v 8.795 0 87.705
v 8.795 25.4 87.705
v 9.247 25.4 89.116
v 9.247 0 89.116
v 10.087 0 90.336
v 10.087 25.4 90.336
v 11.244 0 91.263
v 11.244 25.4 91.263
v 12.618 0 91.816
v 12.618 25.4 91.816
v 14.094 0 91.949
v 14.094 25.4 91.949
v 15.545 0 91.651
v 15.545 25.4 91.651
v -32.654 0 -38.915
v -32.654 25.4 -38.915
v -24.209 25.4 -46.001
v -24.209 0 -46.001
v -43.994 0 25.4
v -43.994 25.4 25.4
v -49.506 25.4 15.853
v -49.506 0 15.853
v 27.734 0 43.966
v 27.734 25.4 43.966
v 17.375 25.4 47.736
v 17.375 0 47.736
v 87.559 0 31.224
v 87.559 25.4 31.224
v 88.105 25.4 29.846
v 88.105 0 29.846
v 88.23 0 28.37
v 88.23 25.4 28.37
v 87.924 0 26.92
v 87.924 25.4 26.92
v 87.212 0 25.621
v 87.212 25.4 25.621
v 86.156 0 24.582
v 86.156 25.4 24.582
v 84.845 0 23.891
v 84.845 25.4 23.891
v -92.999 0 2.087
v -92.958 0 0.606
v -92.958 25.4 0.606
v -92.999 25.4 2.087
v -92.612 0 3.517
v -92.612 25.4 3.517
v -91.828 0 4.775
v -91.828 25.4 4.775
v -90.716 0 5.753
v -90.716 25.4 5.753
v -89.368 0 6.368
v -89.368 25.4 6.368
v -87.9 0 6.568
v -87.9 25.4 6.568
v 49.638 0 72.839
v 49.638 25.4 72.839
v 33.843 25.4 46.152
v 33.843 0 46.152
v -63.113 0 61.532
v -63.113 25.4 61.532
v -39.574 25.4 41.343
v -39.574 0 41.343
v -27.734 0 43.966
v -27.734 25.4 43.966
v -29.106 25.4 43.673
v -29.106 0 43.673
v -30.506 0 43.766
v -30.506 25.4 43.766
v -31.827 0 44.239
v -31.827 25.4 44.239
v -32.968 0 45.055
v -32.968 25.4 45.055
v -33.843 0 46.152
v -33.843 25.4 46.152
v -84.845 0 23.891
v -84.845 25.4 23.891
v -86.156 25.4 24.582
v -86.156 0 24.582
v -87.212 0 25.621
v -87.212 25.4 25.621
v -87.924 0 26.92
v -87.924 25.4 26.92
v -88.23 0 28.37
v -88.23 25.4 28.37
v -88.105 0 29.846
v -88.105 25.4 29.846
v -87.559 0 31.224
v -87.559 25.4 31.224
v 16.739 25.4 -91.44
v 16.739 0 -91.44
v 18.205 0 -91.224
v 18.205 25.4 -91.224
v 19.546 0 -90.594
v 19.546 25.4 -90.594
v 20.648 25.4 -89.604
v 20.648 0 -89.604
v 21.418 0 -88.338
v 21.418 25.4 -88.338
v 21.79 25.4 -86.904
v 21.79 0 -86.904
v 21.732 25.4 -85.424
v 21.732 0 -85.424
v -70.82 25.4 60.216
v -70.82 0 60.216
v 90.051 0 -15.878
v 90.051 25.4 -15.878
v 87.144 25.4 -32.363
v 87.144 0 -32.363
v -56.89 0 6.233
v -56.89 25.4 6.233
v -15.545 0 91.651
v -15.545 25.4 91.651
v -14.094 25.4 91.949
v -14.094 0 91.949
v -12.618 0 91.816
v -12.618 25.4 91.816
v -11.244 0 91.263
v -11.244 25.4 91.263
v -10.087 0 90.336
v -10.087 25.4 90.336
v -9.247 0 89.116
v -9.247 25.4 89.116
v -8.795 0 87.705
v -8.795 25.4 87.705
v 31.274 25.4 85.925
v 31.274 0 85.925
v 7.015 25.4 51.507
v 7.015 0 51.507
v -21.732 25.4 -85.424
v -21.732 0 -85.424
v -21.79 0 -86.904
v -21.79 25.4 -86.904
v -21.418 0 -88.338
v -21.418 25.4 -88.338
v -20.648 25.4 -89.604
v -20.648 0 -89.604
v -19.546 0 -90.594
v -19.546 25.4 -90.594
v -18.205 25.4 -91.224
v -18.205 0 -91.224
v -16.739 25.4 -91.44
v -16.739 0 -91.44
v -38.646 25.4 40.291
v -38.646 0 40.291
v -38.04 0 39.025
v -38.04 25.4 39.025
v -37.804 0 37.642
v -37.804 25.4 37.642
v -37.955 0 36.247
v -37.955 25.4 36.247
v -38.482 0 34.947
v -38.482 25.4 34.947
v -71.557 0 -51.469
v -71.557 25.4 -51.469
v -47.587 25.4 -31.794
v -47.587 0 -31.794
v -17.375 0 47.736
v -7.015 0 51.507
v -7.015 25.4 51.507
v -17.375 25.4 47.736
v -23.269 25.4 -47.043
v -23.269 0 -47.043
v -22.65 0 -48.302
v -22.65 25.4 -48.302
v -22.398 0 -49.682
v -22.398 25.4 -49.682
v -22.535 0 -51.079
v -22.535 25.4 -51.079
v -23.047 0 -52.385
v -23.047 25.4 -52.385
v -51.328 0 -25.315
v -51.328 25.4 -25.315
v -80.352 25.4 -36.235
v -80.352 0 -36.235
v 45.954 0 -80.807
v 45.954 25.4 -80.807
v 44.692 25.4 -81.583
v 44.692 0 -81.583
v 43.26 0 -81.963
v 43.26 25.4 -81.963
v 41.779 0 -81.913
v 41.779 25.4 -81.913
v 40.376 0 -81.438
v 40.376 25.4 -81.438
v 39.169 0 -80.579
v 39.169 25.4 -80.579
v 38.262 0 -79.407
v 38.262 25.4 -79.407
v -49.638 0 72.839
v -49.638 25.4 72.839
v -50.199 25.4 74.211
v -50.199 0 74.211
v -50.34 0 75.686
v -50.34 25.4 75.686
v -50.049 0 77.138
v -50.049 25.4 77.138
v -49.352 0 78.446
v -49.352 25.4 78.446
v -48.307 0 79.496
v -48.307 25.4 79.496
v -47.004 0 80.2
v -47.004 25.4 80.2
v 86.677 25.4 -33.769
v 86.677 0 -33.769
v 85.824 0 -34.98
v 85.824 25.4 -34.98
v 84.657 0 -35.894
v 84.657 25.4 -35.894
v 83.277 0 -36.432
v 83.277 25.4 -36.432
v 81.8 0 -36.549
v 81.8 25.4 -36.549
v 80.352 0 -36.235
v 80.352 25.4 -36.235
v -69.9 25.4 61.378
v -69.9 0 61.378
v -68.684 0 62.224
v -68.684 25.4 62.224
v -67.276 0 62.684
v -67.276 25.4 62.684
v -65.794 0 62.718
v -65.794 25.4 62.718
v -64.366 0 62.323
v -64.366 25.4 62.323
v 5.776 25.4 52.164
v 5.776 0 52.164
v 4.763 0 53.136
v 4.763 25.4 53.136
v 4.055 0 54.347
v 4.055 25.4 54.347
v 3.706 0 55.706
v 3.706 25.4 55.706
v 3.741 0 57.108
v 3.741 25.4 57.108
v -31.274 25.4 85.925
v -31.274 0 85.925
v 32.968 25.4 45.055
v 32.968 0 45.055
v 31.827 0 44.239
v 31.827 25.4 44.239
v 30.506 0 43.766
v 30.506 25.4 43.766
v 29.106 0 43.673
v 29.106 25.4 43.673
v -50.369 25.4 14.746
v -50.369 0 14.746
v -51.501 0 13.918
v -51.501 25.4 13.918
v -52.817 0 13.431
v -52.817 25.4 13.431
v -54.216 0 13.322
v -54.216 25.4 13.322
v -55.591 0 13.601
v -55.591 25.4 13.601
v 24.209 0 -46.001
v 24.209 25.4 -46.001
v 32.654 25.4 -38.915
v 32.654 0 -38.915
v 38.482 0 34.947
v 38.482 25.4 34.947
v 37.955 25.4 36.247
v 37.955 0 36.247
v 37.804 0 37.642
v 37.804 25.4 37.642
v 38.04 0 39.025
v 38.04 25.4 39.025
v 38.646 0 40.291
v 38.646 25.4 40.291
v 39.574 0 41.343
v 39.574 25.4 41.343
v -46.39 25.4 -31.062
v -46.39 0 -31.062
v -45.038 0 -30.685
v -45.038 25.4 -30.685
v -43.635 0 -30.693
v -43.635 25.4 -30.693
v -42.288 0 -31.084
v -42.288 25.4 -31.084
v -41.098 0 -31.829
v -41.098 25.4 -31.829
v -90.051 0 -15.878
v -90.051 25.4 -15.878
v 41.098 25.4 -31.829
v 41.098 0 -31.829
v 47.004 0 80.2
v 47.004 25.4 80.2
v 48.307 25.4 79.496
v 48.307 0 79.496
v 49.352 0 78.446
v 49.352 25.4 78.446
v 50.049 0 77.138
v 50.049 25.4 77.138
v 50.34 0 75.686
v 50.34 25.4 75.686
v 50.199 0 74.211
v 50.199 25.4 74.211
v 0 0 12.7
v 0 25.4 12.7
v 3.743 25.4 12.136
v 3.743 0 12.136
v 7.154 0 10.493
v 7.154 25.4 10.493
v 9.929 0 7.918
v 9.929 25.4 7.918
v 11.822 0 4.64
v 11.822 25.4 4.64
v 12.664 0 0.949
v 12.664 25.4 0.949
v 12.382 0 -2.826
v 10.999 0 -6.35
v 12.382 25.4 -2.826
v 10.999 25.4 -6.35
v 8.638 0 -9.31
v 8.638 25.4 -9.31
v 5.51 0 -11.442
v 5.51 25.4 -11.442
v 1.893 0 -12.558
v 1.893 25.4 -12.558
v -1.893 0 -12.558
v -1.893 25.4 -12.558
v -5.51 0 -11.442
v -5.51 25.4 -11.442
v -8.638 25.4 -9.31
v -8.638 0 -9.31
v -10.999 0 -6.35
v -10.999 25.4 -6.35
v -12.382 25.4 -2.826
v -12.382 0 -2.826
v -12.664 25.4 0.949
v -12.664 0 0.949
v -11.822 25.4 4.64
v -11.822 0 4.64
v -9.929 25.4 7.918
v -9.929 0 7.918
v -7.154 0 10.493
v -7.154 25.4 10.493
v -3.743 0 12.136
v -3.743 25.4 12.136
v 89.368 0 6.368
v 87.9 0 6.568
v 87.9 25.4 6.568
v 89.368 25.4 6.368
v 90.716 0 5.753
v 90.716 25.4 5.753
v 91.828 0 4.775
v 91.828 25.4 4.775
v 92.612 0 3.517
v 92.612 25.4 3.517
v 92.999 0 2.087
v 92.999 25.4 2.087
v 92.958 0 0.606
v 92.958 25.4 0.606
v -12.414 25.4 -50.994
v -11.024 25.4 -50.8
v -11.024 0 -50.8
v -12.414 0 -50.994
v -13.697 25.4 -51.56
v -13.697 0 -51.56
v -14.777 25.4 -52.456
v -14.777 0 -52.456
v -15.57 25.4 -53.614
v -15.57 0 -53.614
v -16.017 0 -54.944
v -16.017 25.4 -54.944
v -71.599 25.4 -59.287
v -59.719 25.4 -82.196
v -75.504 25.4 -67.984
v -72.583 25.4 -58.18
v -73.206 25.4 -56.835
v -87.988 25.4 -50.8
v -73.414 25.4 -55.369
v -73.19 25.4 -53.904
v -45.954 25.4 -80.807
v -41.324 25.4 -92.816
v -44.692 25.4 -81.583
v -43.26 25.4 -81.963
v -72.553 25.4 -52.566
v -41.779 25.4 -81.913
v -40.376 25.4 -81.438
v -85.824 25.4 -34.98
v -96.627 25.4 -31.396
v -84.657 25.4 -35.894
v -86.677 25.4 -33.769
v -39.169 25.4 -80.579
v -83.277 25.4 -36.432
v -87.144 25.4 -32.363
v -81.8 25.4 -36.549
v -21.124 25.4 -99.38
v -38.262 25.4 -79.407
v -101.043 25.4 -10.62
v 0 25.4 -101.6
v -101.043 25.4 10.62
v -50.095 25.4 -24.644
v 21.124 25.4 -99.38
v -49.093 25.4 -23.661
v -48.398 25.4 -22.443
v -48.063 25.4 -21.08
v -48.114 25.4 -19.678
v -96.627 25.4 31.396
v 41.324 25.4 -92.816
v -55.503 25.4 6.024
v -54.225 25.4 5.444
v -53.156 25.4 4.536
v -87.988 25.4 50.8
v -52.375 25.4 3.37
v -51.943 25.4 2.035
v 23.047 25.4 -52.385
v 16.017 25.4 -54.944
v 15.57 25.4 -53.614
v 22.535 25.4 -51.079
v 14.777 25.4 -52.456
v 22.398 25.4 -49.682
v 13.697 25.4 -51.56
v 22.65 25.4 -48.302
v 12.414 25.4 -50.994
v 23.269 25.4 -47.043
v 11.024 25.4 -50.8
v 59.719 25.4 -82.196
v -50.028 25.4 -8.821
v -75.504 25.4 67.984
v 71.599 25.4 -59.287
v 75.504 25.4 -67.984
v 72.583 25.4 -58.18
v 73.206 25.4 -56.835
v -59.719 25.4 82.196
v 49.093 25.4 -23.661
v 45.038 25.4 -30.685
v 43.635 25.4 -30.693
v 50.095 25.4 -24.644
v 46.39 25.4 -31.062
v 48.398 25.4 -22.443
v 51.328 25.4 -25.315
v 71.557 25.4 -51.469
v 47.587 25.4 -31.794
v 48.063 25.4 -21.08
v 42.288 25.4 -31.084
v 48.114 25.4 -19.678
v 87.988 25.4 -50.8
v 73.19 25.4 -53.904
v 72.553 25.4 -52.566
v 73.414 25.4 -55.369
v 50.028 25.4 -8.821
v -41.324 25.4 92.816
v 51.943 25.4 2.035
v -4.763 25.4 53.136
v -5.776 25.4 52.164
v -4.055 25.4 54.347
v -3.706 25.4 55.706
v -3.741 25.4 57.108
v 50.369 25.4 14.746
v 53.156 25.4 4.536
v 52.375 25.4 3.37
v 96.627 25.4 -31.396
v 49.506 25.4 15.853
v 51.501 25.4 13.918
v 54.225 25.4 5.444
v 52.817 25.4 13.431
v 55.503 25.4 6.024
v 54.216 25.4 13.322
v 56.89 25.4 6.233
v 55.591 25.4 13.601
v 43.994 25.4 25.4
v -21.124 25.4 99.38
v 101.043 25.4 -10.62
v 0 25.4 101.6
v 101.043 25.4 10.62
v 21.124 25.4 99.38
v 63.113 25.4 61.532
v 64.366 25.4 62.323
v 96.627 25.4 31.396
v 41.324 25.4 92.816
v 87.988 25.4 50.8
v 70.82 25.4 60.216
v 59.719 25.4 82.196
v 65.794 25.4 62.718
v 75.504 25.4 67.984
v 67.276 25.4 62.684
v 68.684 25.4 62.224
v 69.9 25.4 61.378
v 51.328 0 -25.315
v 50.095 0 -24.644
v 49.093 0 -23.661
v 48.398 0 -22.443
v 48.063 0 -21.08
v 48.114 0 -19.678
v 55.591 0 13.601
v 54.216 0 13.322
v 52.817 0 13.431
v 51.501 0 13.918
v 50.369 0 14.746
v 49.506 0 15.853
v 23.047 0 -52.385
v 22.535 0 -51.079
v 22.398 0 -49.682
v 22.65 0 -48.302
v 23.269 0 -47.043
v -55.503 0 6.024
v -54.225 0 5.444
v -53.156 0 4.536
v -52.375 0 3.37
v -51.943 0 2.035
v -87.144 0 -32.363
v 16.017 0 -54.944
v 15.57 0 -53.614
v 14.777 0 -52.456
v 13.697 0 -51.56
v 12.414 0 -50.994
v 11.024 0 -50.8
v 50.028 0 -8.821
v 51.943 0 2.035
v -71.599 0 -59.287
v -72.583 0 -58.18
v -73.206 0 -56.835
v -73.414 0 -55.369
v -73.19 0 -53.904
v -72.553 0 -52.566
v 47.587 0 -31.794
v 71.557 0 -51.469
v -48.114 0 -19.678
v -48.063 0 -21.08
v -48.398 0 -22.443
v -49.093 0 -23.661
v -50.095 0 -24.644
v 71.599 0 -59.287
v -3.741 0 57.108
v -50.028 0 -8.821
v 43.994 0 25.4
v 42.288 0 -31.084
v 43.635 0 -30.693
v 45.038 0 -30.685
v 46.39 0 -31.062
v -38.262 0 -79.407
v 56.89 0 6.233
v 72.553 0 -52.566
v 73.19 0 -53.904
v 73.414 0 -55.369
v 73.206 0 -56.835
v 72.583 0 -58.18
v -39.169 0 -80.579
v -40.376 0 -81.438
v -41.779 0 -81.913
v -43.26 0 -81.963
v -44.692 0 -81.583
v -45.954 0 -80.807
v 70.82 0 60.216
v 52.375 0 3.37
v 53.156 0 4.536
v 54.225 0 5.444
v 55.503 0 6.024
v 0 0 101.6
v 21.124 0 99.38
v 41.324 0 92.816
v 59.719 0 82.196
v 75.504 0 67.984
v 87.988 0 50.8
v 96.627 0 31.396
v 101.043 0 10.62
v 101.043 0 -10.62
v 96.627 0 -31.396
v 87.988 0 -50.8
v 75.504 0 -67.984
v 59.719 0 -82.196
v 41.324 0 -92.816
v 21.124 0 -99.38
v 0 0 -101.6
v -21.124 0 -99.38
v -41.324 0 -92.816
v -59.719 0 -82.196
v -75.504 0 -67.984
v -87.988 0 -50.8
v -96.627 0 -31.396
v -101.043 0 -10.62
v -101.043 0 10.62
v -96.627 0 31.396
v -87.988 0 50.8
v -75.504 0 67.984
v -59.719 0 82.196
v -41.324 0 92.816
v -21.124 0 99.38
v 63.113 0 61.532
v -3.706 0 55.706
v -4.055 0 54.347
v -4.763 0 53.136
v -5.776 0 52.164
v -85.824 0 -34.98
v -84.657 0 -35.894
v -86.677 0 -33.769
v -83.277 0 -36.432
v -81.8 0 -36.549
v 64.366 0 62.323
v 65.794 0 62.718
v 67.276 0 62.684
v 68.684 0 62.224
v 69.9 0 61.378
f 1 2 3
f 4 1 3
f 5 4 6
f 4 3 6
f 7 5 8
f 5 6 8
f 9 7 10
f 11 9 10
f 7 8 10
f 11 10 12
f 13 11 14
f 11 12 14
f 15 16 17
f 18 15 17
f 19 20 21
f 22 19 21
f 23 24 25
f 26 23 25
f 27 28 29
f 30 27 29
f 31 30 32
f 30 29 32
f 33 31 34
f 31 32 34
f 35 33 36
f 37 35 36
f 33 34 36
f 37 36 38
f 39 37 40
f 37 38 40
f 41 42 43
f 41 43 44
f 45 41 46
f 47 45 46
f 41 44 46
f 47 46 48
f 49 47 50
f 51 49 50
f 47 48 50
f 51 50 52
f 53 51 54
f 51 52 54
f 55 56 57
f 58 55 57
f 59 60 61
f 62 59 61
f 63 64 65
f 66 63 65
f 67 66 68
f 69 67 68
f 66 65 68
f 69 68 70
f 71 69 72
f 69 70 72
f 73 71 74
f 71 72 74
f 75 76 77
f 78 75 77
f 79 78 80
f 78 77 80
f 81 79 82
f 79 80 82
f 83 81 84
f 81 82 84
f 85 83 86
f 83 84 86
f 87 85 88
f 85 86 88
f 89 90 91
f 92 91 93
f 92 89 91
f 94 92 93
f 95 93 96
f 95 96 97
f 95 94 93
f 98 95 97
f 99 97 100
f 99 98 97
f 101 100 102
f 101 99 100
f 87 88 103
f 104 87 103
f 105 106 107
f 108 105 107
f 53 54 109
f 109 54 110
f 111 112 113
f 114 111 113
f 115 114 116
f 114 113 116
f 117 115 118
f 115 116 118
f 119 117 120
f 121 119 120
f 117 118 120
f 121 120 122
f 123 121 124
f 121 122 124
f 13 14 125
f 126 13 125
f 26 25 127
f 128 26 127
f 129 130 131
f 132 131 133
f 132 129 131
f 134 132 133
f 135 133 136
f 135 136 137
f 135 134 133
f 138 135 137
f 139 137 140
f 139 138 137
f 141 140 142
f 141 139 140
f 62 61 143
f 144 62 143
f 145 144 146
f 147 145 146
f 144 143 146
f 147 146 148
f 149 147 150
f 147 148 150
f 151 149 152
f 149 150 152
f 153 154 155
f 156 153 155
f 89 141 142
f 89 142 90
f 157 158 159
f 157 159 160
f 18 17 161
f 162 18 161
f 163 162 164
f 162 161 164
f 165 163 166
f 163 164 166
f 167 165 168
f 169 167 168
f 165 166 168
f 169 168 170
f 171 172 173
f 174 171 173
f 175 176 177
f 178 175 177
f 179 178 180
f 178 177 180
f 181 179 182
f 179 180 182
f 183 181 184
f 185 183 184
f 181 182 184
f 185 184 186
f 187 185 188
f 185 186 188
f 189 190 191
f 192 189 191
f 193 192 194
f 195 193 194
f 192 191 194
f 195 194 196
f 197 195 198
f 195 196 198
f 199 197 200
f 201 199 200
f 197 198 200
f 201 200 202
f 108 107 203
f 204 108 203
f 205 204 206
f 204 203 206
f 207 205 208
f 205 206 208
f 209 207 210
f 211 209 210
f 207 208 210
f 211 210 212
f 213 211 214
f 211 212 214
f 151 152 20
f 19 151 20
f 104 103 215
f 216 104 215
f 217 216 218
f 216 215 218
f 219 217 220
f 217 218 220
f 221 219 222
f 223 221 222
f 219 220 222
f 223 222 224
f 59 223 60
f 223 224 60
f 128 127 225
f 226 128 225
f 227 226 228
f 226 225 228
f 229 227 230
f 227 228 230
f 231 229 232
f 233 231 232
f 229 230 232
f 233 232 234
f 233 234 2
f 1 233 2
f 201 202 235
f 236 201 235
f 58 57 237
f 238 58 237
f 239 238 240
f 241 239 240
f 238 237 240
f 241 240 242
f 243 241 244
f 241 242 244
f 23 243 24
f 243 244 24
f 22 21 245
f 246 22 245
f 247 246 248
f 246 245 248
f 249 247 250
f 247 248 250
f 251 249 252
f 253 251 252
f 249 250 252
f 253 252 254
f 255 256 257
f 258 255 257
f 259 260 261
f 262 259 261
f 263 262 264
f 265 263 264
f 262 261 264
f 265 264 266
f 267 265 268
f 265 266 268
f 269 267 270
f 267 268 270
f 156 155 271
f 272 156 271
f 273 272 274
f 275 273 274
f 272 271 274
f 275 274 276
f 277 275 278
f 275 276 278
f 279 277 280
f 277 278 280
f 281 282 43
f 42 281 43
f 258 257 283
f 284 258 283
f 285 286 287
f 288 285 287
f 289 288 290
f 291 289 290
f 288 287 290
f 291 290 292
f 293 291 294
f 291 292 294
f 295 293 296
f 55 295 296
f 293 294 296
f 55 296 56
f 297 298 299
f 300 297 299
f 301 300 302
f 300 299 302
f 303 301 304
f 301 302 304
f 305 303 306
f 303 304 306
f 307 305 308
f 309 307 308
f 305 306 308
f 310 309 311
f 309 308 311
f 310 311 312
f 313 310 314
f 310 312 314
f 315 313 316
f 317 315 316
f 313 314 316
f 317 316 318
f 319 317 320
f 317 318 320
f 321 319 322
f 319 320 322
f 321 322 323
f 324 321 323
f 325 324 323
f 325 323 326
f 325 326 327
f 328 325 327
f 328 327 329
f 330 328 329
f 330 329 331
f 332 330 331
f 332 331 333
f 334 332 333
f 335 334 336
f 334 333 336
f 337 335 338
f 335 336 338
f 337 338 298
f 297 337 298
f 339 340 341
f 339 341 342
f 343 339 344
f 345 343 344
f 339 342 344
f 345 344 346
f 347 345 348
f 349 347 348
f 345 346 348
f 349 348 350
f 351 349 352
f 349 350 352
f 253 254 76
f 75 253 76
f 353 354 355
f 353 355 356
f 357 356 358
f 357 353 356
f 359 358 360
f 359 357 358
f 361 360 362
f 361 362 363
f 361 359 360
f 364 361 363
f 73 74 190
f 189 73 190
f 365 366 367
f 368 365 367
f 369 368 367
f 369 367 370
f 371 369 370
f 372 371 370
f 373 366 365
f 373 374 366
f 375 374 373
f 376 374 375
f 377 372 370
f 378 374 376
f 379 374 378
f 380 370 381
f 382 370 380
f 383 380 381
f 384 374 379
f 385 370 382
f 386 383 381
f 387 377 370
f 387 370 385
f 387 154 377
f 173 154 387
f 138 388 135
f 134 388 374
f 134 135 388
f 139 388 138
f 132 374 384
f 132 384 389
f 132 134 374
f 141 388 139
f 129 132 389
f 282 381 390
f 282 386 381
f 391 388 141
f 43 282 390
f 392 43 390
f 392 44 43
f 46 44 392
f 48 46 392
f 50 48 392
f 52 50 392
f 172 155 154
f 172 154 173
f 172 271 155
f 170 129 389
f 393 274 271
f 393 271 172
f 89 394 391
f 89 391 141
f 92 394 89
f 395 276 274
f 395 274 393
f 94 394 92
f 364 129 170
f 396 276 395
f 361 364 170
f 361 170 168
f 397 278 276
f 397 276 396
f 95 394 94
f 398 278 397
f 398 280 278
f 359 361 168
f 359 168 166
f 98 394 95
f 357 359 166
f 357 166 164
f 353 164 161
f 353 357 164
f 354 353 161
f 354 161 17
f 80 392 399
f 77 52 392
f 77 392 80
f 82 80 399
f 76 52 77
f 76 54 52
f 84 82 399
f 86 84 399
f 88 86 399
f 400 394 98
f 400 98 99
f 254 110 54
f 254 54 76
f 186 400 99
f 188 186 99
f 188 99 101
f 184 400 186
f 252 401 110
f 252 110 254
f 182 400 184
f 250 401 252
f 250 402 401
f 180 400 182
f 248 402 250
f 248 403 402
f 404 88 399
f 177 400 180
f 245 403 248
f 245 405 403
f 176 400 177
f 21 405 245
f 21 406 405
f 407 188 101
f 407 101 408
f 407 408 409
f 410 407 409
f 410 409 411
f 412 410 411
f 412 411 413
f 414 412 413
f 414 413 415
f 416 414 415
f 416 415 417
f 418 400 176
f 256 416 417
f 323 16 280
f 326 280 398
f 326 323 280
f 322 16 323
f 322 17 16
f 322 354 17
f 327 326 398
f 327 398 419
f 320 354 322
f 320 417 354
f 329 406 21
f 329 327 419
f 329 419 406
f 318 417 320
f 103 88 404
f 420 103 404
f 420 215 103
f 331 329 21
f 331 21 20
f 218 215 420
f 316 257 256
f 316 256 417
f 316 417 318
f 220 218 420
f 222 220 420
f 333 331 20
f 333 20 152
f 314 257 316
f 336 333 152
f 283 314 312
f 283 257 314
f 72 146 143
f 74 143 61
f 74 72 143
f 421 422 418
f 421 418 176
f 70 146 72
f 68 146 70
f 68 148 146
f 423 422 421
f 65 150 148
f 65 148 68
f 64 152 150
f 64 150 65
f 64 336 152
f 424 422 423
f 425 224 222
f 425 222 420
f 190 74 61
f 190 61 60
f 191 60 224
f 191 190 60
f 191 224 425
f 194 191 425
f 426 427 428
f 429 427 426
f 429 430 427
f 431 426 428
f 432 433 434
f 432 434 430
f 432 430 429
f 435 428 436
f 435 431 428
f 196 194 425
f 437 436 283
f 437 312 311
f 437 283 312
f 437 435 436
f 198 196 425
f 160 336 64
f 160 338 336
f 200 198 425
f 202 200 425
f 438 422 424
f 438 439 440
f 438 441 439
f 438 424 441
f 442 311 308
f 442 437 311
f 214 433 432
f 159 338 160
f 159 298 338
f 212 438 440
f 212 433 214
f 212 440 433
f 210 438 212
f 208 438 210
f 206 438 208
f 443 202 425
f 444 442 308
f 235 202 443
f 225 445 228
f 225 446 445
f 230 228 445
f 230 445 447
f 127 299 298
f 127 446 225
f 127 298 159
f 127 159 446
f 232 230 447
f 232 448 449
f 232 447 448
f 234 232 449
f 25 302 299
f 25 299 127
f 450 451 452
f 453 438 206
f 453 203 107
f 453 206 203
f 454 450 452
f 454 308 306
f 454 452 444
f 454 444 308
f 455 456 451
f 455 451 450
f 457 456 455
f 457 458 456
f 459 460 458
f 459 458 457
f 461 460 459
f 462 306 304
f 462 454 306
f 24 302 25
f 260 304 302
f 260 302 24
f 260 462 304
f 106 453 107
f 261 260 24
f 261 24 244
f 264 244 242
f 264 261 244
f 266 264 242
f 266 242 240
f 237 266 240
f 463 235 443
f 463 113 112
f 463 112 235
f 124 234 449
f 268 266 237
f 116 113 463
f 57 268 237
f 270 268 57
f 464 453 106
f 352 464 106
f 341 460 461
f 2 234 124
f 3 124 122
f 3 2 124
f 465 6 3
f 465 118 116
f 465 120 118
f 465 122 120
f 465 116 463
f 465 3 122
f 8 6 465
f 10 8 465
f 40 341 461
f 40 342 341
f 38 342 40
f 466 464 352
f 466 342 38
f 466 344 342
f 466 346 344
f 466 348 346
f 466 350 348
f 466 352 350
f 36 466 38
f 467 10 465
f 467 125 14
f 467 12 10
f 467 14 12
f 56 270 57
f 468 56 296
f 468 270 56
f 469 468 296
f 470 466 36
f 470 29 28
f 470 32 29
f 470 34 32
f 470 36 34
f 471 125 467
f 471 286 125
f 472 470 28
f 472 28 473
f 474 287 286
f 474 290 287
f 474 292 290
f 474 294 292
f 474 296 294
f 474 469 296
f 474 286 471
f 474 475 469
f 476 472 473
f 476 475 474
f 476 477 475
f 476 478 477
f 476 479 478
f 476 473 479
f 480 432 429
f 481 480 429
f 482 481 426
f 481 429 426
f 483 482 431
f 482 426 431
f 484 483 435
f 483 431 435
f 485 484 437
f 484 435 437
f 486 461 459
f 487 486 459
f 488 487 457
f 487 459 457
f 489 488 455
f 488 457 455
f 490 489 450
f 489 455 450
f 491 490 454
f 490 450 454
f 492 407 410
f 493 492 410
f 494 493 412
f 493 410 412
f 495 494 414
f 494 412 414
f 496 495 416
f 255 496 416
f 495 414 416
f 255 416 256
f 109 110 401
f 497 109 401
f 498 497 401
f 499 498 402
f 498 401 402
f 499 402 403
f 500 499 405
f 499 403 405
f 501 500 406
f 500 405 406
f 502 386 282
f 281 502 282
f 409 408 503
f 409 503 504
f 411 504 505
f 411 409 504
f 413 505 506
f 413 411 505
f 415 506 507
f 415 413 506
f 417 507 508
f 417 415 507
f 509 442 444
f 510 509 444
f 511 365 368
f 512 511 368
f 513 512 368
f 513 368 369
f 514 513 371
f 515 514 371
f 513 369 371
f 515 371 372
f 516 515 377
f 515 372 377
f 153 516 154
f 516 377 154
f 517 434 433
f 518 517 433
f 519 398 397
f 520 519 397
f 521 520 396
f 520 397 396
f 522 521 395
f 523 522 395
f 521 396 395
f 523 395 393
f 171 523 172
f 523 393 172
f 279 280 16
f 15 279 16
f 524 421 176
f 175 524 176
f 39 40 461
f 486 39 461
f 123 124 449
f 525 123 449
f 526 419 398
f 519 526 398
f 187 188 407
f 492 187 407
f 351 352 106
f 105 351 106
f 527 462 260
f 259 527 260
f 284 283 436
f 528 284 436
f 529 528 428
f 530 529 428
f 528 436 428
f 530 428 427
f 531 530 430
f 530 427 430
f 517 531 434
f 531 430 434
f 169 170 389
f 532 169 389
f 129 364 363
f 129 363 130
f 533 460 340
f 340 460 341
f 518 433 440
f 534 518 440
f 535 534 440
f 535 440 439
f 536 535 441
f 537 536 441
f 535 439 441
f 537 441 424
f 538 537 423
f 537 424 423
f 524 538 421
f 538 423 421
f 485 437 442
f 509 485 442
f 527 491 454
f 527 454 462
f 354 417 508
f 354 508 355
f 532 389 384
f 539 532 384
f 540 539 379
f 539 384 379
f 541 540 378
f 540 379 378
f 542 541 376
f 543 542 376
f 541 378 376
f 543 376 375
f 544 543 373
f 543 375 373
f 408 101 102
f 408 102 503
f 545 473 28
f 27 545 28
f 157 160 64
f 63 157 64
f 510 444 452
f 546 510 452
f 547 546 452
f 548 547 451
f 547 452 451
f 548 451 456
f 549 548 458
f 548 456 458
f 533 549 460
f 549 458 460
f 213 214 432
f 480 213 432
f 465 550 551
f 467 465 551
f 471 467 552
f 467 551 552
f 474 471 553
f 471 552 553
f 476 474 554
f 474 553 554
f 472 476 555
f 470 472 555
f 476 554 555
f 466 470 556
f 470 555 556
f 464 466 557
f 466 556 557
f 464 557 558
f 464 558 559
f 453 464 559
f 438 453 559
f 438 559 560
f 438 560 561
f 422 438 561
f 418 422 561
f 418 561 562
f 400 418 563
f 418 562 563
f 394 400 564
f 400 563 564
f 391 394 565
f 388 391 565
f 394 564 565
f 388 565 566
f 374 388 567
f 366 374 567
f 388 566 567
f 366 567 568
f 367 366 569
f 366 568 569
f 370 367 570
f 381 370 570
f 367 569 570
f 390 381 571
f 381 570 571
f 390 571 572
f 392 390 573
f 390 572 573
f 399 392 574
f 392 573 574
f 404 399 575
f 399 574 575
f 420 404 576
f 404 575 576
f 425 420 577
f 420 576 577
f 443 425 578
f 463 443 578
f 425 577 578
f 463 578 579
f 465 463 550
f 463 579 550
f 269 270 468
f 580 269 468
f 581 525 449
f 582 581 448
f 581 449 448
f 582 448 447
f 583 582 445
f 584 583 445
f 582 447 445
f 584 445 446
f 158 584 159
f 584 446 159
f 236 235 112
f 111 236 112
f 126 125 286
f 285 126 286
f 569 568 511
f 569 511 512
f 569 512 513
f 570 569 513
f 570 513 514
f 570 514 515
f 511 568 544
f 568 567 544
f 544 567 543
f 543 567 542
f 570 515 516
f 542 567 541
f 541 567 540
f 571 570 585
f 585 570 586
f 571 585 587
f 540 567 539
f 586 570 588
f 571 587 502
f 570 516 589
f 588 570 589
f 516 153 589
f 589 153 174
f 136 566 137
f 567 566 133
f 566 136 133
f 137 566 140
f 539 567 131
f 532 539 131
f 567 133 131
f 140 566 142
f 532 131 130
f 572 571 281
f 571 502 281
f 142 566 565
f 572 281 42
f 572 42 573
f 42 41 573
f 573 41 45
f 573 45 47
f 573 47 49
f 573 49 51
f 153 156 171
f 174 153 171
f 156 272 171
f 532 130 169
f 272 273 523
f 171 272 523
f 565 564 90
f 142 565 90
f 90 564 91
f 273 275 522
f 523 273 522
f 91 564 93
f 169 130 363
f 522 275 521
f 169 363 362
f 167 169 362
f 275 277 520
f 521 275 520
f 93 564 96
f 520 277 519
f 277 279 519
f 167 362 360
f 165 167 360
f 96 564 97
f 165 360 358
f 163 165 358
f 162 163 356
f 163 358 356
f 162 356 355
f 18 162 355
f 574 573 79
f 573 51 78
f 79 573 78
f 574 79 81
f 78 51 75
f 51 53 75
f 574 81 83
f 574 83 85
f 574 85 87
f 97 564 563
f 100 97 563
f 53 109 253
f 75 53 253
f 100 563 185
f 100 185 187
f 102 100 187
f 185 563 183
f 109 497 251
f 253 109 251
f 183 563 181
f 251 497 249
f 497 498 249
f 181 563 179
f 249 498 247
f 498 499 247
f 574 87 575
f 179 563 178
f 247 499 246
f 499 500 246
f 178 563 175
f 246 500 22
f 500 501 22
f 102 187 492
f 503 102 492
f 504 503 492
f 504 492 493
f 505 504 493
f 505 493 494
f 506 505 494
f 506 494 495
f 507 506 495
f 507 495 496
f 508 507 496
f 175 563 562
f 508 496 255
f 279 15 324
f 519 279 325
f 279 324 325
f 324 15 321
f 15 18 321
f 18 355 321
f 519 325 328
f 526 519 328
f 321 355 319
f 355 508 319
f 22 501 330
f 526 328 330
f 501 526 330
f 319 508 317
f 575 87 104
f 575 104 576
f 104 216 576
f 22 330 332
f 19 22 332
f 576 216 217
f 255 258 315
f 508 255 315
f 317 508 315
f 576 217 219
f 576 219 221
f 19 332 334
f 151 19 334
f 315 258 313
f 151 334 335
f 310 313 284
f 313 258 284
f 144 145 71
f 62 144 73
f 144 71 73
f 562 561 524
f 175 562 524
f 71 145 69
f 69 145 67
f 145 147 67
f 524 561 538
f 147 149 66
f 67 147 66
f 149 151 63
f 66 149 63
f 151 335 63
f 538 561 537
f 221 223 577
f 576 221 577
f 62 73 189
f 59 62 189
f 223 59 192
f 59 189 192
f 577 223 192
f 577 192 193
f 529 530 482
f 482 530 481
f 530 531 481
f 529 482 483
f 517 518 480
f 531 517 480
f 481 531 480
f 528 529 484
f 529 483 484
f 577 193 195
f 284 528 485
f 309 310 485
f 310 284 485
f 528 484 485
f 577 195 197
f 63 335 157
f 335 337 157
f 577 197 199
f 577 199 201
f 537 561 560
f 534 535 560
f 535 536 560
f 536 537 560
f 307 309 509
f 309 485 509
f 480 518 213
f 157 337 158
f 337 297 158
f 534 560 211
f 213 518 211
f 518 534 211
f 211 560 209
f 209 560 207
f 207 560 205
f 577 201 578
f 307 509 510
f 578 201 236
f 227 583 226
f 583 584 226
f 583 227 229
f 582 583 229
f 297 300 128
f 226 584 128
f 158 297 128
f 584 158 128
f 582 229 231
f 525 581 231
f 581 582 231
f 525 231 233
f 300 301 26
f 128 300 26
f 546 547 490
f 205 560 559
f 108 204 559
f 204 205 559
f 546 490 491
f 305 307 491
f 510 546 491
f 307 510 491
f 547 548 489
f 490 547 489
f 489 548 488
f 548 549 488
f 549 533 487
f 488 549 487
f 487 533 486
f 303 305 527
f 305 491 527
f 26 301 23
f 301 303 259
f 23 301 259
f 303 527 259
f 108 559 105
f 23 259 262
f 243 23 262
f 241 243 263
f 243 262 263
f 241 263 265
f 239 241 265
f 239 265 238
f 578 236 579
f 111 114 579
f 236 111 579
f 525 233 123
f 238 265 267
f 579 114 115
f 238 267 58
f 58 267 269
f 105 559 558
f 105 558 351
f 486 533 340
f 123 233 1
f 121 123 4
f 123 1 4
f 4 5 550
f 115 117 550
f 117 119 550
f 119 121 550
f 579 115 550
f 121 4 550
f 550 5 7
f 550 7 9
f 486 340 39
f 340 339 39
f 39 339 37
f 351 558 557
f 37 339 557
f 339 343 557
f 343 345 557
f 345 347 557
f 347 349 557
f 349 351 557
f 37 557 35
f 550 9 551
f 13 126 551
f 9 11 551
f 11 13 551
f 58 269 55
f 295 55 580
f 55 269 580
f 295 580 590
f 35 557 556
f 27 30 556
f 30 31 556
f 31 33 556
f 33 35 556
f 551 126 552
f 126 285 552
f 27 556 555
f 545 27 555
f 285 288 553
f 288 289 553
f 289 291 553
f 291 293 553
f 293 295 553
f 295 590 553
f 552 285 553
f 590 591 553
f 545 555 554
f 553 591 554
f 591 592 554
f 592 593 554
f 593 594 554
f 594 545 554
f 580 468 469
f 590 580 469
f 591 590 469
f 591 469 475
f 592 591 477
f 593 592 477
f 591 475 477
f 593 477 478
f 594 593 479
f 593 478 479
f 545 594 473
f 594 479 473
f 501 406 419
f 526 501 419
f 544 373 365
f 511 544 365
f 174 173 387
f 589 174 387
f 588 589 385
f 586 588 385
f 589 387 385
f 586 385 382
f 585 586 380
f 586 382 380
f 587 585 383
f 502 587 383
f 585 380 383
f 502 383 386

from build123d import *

# Parameters (mm, degrees)
SKETCH1_R           = 101.6
BOSS_EXTRUDE1_DEPTH = 25.4
CUT_EXTRUDE1_DEPTH  = 25.4
SKETCH3_R           = 12.7
CUT_EXTRUDE2_DEPTH  = 25.4


with BuildPart() as part:
    # Sketch1 → Boss-Extrude1 (new body)
    with BuildSketch(Plane(origin=(0, 0, 0), x_dir=(1, 0, 0), z_dir=(0, 1, 0))):
        with Locations(Location((0, 0, 0), (0, 0, 270))):
            Circle(SKETCH1_R)
    extrude(amount=BOSS_EXTRUDE1_DEPTH)

    # Sketch2 → Cut-Extrude1 (cut)
    with BuildSketch(Plane(origin=(0, 25.4, 0), x_dir=(1, 0, 0), z_dir=(0, 1, 0))):
        with BuildLine():
            Line((0, 91.44), (16.738974461, 91.44))
            ThreePointArc((16.738974461, 91.44), (20.64808073, 89.604270053), (21.73196517, 85.423814242))
            Line((21.73196517, 85.423814242), (16.01696517, 54.943814242))
            ThreePointArc((16.01696517, 54.943814242), (14.268244513, 51.970893731), (11.023974461, 50.8))
            Line((11.023974461, 50.8), (0, 50.8))
            Line((0, 50.8), (-11.023974461, 50.8))
            ThreePointArc((-11.023974461, 50.8), (-14.268244513, 51.970893731), (-16.01696517, 54.943814242))
            Line((-16.01696517, 54.943814242), (-21.73196517, 85.423814242))
            ThreePointArc((-21.73196517, 85.423814242), (-20.64808073, 89.604270053), (-16.738974461, 91.44))
            Line((-16.738974461, 91.44), (0, 91.44))
        make_face()
        with BuildLine():
            Line((38.26171821, 79.407476156), (23.047495859, 52.38491034))
            ThreePointArc((23.047495859, 52.38491034), (22.476137132, 48.983465131), (24.208756195, 46.001131903))
            Line((24.208756195, 46.001131903), (32.653610572, 38.91505771))
            Line((32.653610572, 38.91505771), (41.098464949, 31.828983518))
            ThreePointArc((41.098464949, 31.828983518), (44.336355977, 30.640563561), (47.586910188, 31.793896828))
            Line((47.586910188, 31.793896828), (71.557020524, 51.469400264))
            ThreePointArc((71.557020524, 51.469400264), (73.413862069, 55.368522696), (71.599297399, 59.287498497))
            Line((71.599297399, 59.287498497), (58.77649903, 70.047103879))
            Line((58.77649903, 70.047103879), (45.953700661, 80.806709261))
            ThreePointArc((45.953700661, 80.806709261), (41.77916706, 81.913183611), (38.26171821, 79.407476156))
        make_face()
        with BuildLine():
            Line((80.352318408, 36.23549746), (51.327777432, 25.314524697))
            ThreePointArc((51.327777432, 25.314524697), (48.703684419, 23.076128807), (48.113940777, 19.677822943))
            Line((48.113940777, 19.677822943), (50.028233853, 8.821327425))
            Line((50.028233853, 8.821327425), (51.942526929, -2.035168092))
            ThreePointArc((51.942526929, -2.035168092), (53.658993735, -5.026826831), (56.890411059, -6.232738262))
            Line((56.890411059, -6.232738262), (87.899750706, -6.568118115))
            ThreePointArc((87.899750706, -6.568118115), (91.828481442, -4.774771782), (92.957513347, -0.606282461))
            Line((92.957513347, -0.606282461), (90.050820935, 15.878389366))
            Line((90.050820935, 15.878389366), (87.144128524, 32.363061192))
            ThreePointArc((87.144128524, 32.363061192), (84.65747826, 35.894008194), (80.352318408, 36.23549746))
        make_face()
        with BuildLine():
            Line((84.845175807, -23.891473209), (55.5912215, -13.600808392))
            ThreePointArc((55.5912215, -13.600808392), (52.142236485, -13.628784649), (49.506077743, -15.852958066))
            Line((49.506077743, -15.852958066), (43.994090512, -25.4))
            Line((43.994090512, -25.4), (38.482103282, -34.947041934))
            ThreePointArc((38.482103282, -34.947041934), (37.873991971, -38.342109081), (39.574256329, -41.34300585))
            Line((39.574256329, -41.34300585), (63.113210637, -61.532341033))
            ThreePointArc((63.113210637, -61.532341033), (67.275533788, -62.683897478), (70.819875692, -60.216377116))
            Line((70.819875692, -60.216377116), (79.189362922, -45.72))
            Line((79.189362922, -45.72), (87.558850152, -31.223622884))
            ThreePointArc((87.558850152, -31.223622884), (87.923614518, -26.920372575), (84.845175807, -23.891473209))
        make_face()
        with BuildLine():
            Line((49.638032496, -72.83935804), (33.8429152, -46.152172078))
            ThreePointArc((33.8429152, -46.152172078), (31.182856603, -43.956638301), (27.733770733, -43.965963811))
            Line((27.733770733, -43.965963811), (17.374623281, -47.736385136))
            Line((17.374623281, -47.736385136), (7.015475828, -51.506806461))
            ThreePointArc((7.015475828, -51.506806461), (4.367328442, -53.716692368), (3.740867244, -57.108421524))
            Line((3.740867244, -57.108421524), (8.795297885, -87.704897725))
            ThreePointArc((8.795297885, -87.704897725), (11.24361619, -91.26253089), (15.544831125, -91.650559689))
            Line((15.544831125, -91.650559689), (31.274321906, -85.925493245))
            Line((31.274321906, -85.925493245), (47.003812686, -80.2004268))
            ThreePointArc((47.003812686, -80.2004268), (50.049314382, -77.138411829), (49.638032496, -72.83935804))
        make_face()
        with BuildLine():
            Line((-8.795297885, -87.704897725), (-3.740867244, -57.108421524))
            ThreePointArc((-3.740867244, -57.108421524), (-4.367328442, -53.716692368), (-7.015475828, -51.506806461))
            Line((-7.015475828, -51.506806461), (-17.374623281, -47.736385136))
            Line((-17.374623281, -47.736385136), (-27.733770733, -43.965963811))
            ThreePointArc((-27.733770733, -43.965963811), (-31.182856603, -43.956638301), (-33.8429152, -46.152172078))
            Line((-33.8429152, -46.152172078), (-49.638032496, -72.83935804))
            ThreePointArc((-49.638032496, -72.83935804), (-50.049314382, -77.138411829), (-47.003812686, -80.2004268))
            Line((-47.003812686, -80.2004268), (-31.274321906, -85.925493245))
            Line((-31.274321906, -85.925493245), (-15.544831125, -91.650559689))
            ThreePointArc((-15.544831125, -91.650559689), (-11.24361619, -91.26253089), (-8.795297885, -87.704897725))
        make_face()
        with BuildLine():
            Line((-63.113210637, -61.532341033), (-39.574256329, -41.34300585))
            ThreePointArc((-39.574256329, -41.34300585), (-37.873991971, -38.342109081), (-38.482103282, -34.947041934))
            Line((-38.482103282, -34.947041934), (-43.994090512, -25.4))
            Line((-43.994090512, -25.4), (-49.506077743, -15.852958066))
            ThreePointArc((-49.506077743, -15.852958066), (-52.142236485, -13.628784649), (-55.5912215, -13.600808392))
            Line((-55.5912215, -13.600808392), (-84.845175807, -23.891473209))
            ThreePointArc((-84.845175807, -23.891473209), (-87.923614518, -26.920372575), (-87.558850152, -31.223622884))
            Line((-87.558850152, -31.223622884), (-79.189362922, -45.72))
            Line((-79.189362922, -45.72), (-70.819875692, -60.216377116))
            ThreePointArc((-70.819875692, -60.216377116), (-67.275533788, -62.683897478), (-63.113210637, -61.532341033))
        make_face()
        with BuildLine():
            Line((-87.899750706, -6.568118115), (-56.890411059, -6.232738262))
            ThreePointArc((-56.890411059, -6.232738262), (-53.658993735, -5.026826831), (-51.942526929, -2.035168092))
            Line((-51.942526929, -2.035168092), (-50.028233853, 8.821327425))
            Line((-50.028233853, 8.821327425), (-48.113940777, 19.677822943))
            ThreePointArc((-48.113940777, 19.677822943), (-48.703684419, 23.076128807), (-51.327777432, 25.314524697))
            Line((-51.327777432, 25.314524697), (-80.352318408, 36.23549746))
            ThreePointArc((-80.352318408, 36.23549746), (-84.65747826, 35.894008194), (-87.144128524, 32.363061192))
            Line((-87.144128524, 32.363061192), (-90.050820935, 15.878389366))
            Line((-90.050820935, 15.878389366), (-92.957513347, -0.606282461))
            ThreePointArc((-92.957513347, -0.606282461), (-91.828481442, -4.774771782), (-87.899750706, -6.568118115))
        make_face()
        with BuildLine():
            Line((-71.557020524, 51.469400264), (-47.586910188, 31.793896828))
            ThreePointArc((-47.586910188, 31.793896828), (-44.336355977, 30.640563561), (-41.098464949, 31.828983518))
            Line((-41.098464949, 31.828983518), (-32.653610572, 38.91505771))
            Line((-32.653610572, 38.91505771), (-24.208756195, 46.001131903))
            ThreePointArc((-24.208756195, 46.001131903), (-22.476137132, 48.983465131), (-23.047495859, 52.38491034))
            Line((-23.047495859, 52.38491034), (-38.26171821, 79.407476156))
            ThreePointArc((-38.26171821, 79.407476156), (-41.77916706, 81.913183611), (-45.953700661, 80.806709261))
            Line((-45.953700661, 80.806709261), (-58.77649903, 70.047103879))
            Line((-58.77649903, 70.047103879), (-71.599297399, 59.287498497))
            ThreePointArc((-71.599297399, 59.287498497), (-73.413862069, 55.368522696), (-71.557020524, 51.469400264))
        make_face()
    extrude(amount=-CUT_EXTRUDE1_DEPTH, mode=Mode.SUBTRACT)

    # Sketch3 → Cut-Extrude2 (cut)
    with BuildSketch(Plane(origin=(0, 25.4, 0), x_dir=(1, 0, 0), z_dir=(0, 1, 0))):
        with Locations(Location((0, 0, 0), (0, 0, 270))):
            Circle(SKETCH3_R)
    extrude(amount=-CUT_EXTRUDE2_DEPTH, mode=Mode.SUBTRACT)


solid = part.part
